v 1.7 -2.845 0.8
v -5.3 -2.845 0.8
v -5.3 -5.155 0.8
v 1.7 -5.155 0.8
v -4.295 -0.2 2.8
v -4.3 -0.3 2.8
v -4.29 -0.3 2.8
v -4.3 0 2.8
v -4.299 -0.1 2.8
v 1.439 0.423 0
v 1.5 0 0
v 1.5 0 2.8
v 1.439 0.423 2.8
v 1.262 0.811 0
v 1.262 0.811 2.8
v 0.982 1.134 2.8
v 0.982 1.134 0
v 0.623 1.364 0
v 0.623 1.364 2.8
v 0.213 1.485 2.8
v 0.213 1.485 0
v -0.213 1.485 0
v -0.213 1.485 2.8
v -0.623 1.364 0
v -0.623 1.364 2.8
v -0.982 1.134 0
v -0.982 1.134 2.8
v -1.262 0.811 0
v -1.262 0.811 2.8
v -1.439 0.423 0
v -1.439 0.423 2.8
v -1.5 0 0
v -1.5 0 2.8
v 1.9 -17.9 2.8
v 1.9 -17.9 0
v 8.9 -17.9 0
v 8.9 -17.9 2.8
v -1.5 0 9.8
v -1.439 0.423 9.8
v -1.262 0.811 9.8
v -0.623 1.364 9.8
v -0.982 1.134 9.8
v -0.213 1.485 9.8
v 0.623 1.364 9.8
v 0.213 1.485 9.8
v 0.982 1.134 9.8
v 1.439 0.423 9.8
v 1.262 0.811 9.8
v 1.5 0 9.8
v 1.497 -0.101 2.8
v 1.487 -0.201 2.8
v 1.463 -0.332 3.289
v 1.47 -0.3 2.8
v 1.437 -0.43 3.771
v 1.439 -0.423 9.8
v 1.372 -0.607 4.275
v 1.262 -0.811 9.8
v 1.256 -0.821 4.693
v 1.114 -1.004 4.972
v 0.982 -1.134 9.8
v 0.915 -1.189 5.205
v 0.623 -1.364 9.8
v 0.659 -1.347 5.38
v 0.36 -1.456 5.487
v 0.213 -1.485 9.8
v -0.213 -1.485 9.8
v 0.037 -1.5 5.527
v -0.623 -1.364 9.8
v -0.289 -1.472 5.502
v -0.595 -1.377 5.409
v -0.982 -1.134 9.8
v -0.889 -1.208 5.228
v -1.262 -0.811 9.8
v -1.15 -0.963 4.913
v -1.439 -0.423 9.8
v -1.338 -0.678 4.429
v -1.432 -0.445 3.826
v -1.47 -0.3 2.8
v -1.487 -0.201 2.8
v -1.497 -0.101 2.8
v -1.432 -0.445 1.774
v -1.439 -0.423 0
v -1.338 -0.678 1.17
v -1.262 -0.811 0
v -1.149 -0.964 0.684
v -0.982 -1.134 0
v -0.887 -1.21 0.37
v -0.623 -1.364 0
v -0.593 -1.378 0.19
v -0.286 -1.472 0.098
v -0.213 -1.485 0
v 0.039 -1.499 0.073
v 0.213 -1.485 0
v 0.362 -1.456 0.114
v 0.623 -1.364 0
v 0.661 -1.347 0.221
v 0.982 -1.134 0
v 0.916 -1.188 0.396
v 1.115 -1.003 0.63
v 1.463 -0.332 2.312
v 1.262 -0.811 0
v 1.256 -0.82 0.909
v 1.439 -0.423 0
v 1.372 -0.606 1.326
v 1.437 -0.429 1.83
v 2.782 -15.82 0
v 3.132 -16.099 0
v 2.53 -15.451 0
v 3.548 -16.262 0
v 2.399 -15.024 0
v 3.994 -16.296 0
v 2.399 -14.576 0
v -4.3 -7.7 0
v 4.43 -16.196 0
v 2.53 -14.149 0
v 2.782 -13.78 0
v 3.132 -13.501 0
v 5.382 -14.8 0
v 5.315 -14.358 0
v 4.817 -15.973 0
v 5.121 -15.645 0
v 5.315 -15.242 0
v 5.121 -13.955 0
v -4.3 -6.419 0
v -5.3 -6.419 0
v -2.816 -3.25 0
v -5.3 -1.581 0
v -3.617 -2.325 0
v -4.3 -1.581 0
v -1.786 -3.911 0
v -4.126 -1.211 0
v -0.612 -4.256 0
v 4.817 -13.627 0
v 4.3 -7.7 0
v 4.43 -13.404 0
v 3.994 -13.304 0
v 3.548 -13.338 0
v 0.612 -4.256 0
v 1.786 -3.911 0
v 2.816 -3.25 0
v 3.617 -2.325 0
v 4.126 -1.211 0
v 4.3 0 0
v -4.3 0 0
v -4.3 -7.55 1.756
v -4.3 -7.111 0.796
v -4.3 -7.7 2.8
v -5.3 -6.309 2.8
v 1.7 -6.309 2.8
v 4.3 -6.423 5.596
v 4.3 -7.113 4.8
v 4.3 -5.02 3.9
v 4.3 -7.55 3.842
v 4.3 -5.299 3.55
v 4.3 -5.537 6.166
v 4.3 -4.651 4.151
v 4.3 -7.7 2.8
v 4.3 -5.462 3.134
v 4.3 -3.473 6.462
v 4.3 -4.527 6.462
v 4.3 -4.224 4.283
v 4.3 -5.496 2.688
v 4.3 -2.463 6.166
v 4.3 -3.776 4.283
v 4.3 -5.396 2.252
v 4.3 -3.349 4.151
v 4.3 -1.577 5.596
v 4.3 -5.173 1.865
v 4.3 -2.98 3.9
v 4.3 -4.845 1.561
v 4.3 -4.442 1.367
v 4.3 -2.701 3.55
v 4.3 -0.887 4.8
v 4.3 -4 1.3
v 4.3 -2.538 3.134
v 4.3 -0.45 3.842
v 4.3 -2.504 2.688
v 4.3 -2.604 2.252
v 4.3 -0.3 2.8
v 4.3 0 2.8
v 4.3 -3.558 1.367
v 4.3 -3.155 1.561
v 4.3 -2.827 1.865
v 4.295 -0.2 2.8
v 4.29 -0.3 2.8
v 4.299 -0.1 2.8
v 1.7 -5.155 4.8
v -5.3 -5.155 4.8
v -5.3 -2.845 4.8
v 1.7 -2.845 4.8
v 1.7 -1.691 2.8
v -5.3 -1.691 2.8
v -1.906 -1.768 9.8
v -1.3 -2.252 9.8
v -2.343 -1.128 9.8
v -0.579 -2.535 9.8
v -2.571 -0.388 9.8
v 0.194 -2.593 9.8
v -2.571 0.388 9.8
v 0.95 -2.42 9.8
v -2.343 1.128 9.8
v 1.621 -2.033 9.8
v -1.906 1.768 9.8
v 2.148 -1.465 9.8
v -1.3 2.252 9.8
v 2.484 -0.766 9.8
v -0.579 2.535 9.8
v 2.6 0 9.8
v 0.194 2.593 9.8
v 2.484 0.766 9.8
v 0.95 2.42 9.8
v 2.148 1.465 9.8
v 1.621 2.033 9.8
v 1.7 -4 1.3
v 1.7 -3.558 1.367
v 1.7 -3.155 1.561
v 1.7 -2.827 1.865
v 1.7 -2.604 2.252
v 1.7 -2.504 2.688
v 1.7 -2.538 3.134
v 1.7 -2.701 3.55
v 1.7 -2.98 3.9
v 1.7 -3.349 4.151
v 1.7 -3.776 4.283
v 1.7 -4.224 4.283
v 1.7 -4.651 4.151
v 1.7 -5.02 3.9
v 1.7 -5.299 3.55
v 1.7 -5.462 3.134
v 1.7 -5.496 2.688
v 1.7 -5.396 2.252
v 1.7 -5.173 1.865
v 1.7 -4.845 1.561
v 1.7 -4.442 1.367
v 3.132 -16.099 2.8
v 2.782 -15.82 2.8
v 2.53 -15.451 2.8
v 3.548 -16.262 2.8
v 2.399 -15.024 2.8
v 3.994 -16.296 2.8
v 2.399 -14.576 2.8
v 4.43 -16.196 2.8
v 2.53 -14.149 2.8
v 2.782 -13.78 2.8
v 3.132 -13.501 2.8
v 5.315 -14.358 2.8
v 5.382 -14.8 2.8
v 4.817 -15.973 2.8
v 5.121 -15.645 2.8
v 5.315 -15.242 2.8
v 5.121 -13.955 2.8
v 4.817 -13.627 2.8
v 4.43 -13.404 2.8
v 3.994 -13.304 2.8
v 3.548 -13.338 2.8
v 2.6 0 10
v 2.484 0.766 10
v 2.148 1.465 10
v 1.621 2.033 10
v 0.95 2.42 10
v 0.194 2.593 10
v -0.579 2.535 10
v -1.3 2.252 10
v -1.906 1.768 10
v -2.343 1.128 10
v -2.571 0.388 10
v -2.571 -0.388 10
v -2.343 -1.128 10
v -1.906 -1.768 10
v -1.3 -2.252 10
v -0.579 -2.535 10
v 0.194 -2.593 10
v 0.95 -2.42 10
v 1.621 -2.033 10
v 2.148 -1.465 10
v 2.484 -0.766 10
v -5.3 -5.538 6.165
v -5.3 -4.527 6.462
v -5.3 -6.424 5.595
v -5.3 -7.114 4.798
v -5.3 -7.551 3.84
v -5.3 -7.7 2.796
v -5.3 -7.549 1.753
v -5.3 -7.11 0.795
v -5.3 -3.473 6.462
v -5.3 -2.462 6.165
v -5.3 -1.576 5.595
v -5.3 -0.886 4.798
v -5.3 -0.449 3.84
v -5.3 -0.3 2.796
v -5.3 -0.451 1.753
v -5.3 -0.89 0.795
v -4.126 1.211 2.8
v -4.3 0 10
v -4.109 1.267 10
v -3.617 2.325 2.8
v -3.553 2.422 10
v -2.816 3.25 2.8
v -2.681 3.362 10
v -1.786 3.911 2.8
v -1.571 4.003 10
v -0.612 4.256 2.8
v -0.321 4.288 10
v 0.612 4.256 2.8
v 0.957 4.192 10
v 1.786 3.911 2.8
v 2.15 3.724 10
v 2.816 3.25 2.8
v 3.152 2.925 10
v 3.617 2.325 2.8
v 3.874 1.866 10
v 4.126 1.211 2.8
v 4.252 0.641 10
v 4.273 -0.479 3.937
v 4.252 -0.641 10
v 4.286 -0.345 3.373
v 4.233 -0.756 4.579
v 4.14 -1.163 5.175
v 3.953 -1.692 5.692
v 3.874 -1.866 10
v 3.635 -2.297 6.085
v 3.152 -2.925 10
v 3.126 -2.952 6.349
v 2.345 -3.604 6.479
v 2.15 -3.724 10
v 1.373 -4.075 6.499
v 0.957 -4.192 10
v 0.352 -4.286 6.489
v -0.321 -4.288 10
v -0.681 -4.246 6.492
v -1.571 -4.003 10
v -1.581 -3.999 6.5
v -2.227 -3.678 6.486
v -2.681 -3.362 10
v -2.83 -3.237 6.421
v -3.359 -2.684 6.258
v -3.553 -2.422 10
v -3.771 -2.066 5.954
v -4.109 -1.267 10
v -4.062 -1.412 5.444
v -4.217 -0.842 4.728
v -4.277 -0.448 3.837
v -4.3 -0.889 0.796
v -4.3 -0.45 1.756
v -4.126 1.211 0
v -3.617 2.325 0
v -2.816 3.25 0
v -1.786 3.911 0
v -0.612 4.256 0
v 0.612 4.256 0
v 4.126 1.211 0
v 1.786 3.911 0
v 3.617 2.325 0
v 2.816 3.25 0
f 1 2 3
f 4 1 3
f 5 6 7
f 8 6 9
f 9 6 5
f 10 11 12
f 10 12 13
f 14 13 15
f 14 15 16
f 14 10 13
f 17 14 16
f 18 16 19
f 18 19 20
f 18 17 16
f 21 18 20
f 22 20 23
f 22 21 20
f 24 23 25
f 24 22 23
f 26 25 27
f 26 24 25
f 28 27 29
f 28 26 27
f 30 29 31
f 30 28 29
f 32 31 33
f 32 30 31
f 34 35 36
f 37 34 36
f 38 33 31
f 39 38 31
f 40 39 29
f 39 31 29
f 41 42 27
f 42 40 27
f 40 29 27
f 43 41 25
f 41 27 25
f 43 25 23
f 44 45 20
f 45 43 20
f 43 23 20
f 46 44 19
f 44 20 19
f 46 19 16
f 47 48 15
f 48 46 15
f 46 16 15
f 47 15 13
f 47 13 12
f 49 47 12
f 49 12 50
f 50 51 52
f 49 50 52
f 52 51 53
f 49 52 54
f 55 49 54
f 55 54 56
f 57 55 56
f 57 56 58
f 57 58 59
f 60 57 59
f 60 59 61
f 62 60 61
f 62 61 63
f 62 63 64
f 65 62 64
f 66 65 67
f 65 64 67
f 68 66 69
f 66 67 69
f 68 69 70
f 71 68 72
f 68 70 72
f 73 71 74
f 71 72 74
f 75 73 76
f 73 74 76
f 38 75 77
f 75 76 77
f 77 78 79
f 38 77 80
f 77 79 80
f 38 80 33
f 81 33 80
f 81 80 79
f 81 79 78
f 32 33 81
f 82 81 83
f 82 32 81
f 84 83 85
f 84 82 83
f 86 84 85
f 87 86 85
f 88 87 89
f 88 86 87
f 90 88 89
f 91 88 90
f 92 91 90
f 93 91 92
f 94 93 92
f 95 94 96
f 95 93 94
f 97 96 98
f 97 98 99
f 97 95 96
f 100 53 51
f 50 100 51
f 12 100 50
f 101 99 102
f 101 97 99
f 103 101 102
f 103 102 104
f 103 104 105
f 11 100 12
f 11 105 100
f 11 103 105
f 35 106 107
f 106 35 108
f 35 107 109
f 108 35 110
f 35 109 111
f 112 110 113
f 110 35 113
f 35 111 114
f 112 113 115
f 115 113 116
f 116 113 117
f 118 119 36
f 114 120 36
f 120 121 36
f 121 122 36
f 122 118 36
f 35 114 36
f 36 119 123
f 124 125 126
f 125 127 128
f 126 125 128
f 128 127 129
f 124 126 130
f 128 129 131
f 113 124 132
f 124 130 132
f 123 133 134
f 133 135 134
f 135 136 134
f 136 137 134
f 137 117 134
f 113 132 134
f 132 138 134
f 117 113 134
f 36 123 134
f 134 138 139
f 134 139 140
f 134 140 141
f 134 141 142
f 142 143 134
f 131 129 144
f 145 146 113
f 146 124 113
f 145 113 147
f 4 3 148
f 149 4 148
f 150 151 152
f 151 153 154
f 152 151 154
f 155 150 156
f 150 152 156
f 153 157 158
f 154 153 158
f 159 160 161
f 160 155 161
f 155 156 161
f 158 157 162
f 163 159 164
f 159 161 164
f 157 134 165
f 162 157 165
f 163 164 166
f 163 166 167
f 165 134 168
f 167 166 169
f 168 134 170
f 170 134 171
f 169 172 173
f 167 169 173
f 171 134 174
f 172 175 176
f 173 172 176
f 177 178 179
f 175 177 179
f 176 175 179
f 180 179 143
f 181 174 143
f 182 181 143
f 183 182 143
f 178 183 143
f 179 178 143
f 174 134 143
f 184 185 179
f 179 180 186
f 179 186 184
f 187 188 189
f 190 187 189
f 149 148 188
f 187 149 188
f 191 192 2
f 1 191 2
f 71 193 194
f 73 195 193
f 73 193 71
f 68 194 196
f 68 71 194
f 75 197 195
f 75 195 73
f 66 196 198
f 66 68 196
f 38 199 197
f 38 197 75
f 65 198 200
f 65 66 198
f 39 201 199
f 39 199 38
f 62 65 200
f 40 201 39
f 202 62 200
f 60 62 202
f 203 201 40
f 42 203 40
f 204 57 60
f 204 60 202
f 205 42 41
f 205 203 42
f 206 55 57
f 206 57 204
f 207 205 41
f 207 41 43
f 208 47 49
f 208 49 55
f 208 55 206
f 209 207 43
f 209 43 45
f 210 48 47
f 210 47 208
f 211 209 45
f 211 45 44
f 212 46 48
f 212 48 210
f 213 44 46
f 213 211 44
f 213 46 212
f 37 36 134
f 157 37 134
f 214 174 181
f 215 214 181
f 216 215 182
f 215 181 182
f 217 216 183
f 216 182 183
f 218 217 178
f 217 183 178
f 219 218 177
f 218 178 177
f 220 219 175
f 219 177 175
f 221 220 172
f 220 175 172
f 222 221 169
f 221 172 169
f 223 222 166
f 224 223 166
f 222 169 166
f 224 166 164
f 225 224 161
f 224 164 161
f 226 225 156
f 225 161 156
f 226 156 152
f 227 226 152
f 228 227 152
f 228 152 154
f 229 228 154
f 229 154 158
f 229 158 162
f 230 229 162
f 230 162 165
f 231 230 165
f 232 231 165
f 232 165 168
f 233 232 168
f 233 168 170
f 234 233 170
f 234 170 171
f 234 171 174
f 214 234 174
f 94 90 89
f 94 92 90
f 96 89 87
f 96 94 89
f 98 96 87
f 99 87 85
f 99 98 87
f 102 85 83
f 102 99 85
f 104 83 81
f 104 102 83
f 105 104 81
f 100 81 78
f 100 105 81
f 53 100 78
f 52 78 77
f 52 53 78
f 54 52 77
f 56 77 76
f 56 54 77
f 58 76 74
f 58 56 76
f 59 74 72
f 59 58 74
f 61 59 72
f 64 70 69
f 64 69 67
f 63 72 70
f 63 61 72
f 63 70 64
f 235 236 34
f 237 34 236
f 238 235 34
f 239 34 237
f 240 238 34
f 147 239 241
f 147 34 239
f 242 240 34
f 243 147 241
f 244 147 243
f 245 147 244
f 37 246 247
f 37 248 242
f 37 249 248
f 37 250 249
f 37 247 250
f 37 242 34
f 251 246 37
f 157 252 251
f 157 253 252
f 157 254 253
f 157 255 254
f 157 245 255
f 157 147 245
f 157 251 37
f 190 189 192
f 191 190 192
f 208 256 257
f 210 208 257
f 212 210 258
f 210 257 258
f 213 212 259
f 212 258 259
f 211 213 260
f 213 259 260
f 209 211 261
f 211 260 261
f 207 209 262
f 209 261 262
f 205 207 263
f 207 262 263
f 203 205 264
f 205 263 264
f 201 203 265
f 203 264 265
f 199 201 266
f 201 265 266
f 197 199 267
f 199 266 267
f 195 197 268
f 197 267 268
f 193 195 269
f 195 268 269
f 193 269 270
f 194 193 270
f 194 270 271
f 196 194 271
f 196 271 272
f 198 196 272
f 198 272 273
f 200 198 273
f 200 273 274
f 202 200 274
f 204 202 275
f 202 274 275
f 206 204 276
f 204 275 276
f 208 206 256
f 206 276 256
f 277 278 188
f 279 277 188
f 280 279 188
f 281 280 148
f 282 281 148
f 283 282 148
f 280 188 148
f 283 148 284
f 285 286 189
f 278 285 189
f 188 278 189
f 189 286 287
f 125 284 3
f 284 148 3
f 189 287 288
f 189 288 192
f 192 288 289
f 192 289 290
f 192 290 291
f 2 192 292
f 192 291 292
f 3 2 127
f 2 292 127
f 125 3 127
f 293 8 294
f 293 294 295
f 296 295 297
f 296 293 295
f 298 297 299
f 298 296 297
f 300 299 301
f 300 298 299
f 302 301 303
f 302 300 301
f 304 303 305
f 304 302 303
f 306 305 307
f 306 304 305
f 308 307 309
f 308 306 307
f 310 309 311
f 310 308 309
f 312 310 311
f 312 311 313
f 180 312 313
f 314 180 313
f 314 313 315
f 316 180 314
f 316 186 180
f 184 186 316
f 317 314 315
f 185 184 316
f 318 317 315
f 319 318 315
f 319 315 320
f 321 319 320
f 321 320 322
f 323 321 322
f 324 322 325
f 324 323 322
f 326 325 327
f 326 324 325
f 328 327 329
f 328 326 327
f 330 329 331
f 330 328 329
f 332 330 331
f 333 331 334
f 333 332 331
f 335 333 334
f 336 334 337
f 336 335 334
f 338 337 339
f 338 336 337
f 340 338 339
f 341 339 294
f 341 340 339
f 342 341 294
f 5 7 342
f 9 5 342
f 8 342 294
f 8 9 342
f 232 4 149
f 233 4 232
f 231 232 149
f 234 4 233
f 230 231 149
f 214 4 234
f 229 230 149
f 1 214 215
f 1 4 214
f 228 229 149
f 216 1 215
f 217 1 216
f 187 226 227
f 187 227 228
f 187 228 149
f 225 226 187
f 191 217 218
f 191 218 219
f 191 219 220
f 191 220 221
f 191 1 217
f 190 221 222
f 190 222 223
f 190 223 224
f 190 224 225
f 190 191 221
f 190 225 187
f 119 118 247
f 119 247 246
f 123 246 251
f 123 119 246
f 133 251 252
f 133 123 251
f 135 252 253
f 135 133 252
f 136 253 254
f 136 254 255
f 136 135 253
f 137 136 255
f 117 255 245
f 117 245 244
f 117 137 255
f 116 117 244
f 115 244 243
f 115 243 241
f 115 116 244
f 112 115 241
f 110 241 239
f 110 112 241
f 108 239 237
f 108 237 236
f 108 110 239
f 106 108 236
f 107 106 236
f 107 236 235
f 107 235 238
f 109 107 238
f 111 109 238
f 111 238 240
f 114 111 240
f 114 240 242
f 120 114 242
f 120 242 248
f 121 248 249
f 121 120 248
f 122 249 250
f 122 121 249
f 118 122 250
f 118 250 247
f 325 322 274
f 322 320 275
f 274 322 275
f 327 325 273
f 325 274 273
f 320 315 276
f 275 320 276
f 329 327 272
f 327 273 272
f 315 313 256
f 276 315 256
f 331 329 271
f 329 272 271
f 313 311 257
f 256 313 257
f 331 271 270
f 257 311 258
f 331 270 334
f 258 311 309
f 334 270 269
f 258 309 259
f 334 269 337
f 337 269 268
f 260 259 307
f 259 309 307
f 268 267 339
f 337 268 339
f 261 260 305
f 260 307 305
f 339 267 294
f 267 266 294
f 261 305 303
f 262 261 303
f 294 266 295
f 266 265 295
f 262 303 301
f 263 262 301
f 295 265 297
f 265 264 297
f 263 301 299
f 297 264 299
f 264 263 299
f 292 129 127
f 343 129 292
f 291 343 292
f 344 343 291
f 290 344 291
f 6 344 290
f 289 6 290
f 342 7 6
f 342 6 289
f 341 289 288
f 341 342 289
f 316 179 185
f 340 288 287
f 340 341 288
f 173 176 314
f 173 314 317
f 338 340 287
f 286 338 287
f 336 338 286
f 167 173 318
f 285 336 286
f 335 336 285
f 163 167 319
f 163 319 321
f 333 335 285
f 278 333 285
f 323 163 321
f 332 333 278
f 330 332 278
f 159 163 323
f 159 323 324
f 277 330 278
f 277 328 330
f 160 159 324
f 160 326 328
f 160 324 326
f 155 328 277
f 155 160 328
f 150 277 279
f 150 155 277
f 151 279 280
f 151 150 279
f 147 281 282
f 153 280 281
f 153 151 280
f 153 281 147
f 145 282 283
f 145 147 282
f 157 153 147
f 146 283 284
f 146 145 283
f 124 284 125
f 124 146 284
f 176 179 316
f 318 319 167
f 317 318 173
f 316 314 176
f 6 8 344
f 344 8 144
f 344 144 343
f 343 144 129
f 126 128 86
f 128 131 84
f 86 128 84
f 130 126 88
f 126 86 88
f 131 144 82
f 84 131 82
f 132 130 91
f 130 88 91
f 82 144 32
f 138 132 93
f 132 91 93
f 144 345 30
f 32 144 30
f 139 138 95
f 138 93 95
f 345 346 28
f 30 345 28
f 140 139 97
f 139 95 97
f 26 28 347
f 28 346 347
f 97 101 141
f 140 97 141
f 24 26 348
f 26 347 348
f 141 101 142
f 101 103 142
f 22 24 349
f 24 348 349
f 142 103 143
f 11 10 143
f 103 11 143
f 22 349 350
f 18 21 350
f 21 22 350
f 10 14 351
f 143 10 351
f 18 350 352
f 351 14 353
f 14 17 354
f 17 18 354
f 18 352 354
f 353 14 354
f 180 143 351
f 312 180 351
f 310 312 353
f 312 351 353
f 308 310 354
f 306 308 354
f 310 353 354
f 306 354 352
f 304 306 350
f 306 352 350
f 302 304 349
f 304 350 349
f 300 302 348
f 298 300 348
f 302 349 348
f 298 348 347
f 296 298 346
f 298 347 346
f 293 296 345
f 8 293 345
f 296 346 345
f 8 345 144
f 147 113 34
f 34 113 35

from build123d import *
from build123d.topology import SkipClean

# Parameters (mm, degrees)
SKETCH_1_R          = 1.5
EXTRUDE_1_DEPTH     = 2.8
EXTRUDE_2_DEPTH     = 9.6
SKETCH_3_R          = 4.3
SKETCH_3_R_2        = 1.5
EXTRUDE_4_DEPTH     = 10
CUT_EXTRUDE_START   = -0.2
SKETCH_4_R          = 2.6
SKETCH_4_R_2        = 1.5
CUT_EXTRUDE_1_DEPTH = 0.2
CUT_EXTRUDE_2_DEPTH = 7
SKETCH_6_R          = 1.5
CUT_EXTRUDE_3_DEPTH = 23.64000892


with BuildPart() as part:
    # 草图1 → 凸台-拉伸1 (new body)
    with BuildSketch(Plane.XY):
        with BuildLine():
            Line((4.3, -7.7), (4.3, 0))
            ThreePointArc((4.3, 0), (0, 4.3), (-4.3, 0))
            Line((-4.3, 0), (-4.3, -7.7))
            Line((-4.3, -7.7), (1.9, -17.9))
            Line((1.9, -17.9), (8.9, -17.9))
            Line((8.9, -17.9), (4.3, -7.7))
        make_face()
        Circle(SKETCH_1_R, mode=Mode.SUBTRACT)
        with Locations((3.881899419, -14.8)):
            Circle(SKETCH_1_R, mode=Mode.SUBTRACT)
    extrude(amount=EXTRUDE_1_DEPTH)

    # 草图2 → 凸台-拉伸2 (add)
    with BuildSketch(Plane(origin=(4.3, 0, 0), x_dir=(0, 0, -1), z_dir=(1, 0, 0))):
        with BuildLine():
            Line((0, -6.418677324), (0, -1.581322676))
            ThreePointArc((0, -1.581322676), (-6.5, -4), (0, -6.418677324))
        make_face()
    extrude(amount=-EXTRUDE_2_DEPTH)

    # 草图3 → 凸台-拉伸4 (add)
    with SkipClean():  # the faces are left unmerged after this step: merging them gives an invalid solid
        with BuildSketch(Plane(origin=(0, 0, 0), x_dir=(-1, 0, 0), z_dir=(0, 0, -1))):
            Circle(SKETCH_3_R)
            Circle(SKETCH_3_R_2, mode=Mode.SUBTRACT)
        extrude(amount=-EXTRUDE_4_DEPTH)

    # 草图4 → 切除-拉伸1 (cut)
    with SkipClean():  # the faces are left unmerged after this step: merging them gives an invalid solid
        with BuildSketch(Plane.XY.offset(10).offset(CUT_EXTRUDE_START)):
            Circle(SKETCH_4_R)
            Circle(SKETCH_4_R_2, mode=Mode.SUBTRACT)
        extrude(amount=CUT_EXTRUDE_1_DEPTH, mode=Mode.SUBTRACT)

    # 草图5 → 切除-拉伸2 (cut)
    with SkipClean():  # the faces are left unmerged after this step: merging them gives an invalid solid
        with BuildSketch(Plane.ZY.offset(5.3)):
            Polygon((0.8, -5.154700538), (2.8, -6.309401077), (4.8, -5.154700538), (4.8, -2.845299462), (2.8, -1.690598923), (0.8, -2.845299462), align=None)
        extrude(amount=-CUT_EXTRUDE_2_DEPTH, mode=Mode.SUBTRACT)

    # 草图6 → 切除-拉伸3 (cut, through all)
    with SkipClean():  # the faces are left unmerged after this step: merging them gives an invalid solid
        with BuildSketch(Plane(origin=(4.3, 0, 0), x_dir=(0, 0, -1), z_dir=(1, 0, 0))):
            with Locations((-2.8, -4)):
                Circle(SKETCH_6_R)
        extrude(amount=-CUT_EXTRUDE_3_DEPTH, mode=Mode.SUBTRACT)


solid = part.part
